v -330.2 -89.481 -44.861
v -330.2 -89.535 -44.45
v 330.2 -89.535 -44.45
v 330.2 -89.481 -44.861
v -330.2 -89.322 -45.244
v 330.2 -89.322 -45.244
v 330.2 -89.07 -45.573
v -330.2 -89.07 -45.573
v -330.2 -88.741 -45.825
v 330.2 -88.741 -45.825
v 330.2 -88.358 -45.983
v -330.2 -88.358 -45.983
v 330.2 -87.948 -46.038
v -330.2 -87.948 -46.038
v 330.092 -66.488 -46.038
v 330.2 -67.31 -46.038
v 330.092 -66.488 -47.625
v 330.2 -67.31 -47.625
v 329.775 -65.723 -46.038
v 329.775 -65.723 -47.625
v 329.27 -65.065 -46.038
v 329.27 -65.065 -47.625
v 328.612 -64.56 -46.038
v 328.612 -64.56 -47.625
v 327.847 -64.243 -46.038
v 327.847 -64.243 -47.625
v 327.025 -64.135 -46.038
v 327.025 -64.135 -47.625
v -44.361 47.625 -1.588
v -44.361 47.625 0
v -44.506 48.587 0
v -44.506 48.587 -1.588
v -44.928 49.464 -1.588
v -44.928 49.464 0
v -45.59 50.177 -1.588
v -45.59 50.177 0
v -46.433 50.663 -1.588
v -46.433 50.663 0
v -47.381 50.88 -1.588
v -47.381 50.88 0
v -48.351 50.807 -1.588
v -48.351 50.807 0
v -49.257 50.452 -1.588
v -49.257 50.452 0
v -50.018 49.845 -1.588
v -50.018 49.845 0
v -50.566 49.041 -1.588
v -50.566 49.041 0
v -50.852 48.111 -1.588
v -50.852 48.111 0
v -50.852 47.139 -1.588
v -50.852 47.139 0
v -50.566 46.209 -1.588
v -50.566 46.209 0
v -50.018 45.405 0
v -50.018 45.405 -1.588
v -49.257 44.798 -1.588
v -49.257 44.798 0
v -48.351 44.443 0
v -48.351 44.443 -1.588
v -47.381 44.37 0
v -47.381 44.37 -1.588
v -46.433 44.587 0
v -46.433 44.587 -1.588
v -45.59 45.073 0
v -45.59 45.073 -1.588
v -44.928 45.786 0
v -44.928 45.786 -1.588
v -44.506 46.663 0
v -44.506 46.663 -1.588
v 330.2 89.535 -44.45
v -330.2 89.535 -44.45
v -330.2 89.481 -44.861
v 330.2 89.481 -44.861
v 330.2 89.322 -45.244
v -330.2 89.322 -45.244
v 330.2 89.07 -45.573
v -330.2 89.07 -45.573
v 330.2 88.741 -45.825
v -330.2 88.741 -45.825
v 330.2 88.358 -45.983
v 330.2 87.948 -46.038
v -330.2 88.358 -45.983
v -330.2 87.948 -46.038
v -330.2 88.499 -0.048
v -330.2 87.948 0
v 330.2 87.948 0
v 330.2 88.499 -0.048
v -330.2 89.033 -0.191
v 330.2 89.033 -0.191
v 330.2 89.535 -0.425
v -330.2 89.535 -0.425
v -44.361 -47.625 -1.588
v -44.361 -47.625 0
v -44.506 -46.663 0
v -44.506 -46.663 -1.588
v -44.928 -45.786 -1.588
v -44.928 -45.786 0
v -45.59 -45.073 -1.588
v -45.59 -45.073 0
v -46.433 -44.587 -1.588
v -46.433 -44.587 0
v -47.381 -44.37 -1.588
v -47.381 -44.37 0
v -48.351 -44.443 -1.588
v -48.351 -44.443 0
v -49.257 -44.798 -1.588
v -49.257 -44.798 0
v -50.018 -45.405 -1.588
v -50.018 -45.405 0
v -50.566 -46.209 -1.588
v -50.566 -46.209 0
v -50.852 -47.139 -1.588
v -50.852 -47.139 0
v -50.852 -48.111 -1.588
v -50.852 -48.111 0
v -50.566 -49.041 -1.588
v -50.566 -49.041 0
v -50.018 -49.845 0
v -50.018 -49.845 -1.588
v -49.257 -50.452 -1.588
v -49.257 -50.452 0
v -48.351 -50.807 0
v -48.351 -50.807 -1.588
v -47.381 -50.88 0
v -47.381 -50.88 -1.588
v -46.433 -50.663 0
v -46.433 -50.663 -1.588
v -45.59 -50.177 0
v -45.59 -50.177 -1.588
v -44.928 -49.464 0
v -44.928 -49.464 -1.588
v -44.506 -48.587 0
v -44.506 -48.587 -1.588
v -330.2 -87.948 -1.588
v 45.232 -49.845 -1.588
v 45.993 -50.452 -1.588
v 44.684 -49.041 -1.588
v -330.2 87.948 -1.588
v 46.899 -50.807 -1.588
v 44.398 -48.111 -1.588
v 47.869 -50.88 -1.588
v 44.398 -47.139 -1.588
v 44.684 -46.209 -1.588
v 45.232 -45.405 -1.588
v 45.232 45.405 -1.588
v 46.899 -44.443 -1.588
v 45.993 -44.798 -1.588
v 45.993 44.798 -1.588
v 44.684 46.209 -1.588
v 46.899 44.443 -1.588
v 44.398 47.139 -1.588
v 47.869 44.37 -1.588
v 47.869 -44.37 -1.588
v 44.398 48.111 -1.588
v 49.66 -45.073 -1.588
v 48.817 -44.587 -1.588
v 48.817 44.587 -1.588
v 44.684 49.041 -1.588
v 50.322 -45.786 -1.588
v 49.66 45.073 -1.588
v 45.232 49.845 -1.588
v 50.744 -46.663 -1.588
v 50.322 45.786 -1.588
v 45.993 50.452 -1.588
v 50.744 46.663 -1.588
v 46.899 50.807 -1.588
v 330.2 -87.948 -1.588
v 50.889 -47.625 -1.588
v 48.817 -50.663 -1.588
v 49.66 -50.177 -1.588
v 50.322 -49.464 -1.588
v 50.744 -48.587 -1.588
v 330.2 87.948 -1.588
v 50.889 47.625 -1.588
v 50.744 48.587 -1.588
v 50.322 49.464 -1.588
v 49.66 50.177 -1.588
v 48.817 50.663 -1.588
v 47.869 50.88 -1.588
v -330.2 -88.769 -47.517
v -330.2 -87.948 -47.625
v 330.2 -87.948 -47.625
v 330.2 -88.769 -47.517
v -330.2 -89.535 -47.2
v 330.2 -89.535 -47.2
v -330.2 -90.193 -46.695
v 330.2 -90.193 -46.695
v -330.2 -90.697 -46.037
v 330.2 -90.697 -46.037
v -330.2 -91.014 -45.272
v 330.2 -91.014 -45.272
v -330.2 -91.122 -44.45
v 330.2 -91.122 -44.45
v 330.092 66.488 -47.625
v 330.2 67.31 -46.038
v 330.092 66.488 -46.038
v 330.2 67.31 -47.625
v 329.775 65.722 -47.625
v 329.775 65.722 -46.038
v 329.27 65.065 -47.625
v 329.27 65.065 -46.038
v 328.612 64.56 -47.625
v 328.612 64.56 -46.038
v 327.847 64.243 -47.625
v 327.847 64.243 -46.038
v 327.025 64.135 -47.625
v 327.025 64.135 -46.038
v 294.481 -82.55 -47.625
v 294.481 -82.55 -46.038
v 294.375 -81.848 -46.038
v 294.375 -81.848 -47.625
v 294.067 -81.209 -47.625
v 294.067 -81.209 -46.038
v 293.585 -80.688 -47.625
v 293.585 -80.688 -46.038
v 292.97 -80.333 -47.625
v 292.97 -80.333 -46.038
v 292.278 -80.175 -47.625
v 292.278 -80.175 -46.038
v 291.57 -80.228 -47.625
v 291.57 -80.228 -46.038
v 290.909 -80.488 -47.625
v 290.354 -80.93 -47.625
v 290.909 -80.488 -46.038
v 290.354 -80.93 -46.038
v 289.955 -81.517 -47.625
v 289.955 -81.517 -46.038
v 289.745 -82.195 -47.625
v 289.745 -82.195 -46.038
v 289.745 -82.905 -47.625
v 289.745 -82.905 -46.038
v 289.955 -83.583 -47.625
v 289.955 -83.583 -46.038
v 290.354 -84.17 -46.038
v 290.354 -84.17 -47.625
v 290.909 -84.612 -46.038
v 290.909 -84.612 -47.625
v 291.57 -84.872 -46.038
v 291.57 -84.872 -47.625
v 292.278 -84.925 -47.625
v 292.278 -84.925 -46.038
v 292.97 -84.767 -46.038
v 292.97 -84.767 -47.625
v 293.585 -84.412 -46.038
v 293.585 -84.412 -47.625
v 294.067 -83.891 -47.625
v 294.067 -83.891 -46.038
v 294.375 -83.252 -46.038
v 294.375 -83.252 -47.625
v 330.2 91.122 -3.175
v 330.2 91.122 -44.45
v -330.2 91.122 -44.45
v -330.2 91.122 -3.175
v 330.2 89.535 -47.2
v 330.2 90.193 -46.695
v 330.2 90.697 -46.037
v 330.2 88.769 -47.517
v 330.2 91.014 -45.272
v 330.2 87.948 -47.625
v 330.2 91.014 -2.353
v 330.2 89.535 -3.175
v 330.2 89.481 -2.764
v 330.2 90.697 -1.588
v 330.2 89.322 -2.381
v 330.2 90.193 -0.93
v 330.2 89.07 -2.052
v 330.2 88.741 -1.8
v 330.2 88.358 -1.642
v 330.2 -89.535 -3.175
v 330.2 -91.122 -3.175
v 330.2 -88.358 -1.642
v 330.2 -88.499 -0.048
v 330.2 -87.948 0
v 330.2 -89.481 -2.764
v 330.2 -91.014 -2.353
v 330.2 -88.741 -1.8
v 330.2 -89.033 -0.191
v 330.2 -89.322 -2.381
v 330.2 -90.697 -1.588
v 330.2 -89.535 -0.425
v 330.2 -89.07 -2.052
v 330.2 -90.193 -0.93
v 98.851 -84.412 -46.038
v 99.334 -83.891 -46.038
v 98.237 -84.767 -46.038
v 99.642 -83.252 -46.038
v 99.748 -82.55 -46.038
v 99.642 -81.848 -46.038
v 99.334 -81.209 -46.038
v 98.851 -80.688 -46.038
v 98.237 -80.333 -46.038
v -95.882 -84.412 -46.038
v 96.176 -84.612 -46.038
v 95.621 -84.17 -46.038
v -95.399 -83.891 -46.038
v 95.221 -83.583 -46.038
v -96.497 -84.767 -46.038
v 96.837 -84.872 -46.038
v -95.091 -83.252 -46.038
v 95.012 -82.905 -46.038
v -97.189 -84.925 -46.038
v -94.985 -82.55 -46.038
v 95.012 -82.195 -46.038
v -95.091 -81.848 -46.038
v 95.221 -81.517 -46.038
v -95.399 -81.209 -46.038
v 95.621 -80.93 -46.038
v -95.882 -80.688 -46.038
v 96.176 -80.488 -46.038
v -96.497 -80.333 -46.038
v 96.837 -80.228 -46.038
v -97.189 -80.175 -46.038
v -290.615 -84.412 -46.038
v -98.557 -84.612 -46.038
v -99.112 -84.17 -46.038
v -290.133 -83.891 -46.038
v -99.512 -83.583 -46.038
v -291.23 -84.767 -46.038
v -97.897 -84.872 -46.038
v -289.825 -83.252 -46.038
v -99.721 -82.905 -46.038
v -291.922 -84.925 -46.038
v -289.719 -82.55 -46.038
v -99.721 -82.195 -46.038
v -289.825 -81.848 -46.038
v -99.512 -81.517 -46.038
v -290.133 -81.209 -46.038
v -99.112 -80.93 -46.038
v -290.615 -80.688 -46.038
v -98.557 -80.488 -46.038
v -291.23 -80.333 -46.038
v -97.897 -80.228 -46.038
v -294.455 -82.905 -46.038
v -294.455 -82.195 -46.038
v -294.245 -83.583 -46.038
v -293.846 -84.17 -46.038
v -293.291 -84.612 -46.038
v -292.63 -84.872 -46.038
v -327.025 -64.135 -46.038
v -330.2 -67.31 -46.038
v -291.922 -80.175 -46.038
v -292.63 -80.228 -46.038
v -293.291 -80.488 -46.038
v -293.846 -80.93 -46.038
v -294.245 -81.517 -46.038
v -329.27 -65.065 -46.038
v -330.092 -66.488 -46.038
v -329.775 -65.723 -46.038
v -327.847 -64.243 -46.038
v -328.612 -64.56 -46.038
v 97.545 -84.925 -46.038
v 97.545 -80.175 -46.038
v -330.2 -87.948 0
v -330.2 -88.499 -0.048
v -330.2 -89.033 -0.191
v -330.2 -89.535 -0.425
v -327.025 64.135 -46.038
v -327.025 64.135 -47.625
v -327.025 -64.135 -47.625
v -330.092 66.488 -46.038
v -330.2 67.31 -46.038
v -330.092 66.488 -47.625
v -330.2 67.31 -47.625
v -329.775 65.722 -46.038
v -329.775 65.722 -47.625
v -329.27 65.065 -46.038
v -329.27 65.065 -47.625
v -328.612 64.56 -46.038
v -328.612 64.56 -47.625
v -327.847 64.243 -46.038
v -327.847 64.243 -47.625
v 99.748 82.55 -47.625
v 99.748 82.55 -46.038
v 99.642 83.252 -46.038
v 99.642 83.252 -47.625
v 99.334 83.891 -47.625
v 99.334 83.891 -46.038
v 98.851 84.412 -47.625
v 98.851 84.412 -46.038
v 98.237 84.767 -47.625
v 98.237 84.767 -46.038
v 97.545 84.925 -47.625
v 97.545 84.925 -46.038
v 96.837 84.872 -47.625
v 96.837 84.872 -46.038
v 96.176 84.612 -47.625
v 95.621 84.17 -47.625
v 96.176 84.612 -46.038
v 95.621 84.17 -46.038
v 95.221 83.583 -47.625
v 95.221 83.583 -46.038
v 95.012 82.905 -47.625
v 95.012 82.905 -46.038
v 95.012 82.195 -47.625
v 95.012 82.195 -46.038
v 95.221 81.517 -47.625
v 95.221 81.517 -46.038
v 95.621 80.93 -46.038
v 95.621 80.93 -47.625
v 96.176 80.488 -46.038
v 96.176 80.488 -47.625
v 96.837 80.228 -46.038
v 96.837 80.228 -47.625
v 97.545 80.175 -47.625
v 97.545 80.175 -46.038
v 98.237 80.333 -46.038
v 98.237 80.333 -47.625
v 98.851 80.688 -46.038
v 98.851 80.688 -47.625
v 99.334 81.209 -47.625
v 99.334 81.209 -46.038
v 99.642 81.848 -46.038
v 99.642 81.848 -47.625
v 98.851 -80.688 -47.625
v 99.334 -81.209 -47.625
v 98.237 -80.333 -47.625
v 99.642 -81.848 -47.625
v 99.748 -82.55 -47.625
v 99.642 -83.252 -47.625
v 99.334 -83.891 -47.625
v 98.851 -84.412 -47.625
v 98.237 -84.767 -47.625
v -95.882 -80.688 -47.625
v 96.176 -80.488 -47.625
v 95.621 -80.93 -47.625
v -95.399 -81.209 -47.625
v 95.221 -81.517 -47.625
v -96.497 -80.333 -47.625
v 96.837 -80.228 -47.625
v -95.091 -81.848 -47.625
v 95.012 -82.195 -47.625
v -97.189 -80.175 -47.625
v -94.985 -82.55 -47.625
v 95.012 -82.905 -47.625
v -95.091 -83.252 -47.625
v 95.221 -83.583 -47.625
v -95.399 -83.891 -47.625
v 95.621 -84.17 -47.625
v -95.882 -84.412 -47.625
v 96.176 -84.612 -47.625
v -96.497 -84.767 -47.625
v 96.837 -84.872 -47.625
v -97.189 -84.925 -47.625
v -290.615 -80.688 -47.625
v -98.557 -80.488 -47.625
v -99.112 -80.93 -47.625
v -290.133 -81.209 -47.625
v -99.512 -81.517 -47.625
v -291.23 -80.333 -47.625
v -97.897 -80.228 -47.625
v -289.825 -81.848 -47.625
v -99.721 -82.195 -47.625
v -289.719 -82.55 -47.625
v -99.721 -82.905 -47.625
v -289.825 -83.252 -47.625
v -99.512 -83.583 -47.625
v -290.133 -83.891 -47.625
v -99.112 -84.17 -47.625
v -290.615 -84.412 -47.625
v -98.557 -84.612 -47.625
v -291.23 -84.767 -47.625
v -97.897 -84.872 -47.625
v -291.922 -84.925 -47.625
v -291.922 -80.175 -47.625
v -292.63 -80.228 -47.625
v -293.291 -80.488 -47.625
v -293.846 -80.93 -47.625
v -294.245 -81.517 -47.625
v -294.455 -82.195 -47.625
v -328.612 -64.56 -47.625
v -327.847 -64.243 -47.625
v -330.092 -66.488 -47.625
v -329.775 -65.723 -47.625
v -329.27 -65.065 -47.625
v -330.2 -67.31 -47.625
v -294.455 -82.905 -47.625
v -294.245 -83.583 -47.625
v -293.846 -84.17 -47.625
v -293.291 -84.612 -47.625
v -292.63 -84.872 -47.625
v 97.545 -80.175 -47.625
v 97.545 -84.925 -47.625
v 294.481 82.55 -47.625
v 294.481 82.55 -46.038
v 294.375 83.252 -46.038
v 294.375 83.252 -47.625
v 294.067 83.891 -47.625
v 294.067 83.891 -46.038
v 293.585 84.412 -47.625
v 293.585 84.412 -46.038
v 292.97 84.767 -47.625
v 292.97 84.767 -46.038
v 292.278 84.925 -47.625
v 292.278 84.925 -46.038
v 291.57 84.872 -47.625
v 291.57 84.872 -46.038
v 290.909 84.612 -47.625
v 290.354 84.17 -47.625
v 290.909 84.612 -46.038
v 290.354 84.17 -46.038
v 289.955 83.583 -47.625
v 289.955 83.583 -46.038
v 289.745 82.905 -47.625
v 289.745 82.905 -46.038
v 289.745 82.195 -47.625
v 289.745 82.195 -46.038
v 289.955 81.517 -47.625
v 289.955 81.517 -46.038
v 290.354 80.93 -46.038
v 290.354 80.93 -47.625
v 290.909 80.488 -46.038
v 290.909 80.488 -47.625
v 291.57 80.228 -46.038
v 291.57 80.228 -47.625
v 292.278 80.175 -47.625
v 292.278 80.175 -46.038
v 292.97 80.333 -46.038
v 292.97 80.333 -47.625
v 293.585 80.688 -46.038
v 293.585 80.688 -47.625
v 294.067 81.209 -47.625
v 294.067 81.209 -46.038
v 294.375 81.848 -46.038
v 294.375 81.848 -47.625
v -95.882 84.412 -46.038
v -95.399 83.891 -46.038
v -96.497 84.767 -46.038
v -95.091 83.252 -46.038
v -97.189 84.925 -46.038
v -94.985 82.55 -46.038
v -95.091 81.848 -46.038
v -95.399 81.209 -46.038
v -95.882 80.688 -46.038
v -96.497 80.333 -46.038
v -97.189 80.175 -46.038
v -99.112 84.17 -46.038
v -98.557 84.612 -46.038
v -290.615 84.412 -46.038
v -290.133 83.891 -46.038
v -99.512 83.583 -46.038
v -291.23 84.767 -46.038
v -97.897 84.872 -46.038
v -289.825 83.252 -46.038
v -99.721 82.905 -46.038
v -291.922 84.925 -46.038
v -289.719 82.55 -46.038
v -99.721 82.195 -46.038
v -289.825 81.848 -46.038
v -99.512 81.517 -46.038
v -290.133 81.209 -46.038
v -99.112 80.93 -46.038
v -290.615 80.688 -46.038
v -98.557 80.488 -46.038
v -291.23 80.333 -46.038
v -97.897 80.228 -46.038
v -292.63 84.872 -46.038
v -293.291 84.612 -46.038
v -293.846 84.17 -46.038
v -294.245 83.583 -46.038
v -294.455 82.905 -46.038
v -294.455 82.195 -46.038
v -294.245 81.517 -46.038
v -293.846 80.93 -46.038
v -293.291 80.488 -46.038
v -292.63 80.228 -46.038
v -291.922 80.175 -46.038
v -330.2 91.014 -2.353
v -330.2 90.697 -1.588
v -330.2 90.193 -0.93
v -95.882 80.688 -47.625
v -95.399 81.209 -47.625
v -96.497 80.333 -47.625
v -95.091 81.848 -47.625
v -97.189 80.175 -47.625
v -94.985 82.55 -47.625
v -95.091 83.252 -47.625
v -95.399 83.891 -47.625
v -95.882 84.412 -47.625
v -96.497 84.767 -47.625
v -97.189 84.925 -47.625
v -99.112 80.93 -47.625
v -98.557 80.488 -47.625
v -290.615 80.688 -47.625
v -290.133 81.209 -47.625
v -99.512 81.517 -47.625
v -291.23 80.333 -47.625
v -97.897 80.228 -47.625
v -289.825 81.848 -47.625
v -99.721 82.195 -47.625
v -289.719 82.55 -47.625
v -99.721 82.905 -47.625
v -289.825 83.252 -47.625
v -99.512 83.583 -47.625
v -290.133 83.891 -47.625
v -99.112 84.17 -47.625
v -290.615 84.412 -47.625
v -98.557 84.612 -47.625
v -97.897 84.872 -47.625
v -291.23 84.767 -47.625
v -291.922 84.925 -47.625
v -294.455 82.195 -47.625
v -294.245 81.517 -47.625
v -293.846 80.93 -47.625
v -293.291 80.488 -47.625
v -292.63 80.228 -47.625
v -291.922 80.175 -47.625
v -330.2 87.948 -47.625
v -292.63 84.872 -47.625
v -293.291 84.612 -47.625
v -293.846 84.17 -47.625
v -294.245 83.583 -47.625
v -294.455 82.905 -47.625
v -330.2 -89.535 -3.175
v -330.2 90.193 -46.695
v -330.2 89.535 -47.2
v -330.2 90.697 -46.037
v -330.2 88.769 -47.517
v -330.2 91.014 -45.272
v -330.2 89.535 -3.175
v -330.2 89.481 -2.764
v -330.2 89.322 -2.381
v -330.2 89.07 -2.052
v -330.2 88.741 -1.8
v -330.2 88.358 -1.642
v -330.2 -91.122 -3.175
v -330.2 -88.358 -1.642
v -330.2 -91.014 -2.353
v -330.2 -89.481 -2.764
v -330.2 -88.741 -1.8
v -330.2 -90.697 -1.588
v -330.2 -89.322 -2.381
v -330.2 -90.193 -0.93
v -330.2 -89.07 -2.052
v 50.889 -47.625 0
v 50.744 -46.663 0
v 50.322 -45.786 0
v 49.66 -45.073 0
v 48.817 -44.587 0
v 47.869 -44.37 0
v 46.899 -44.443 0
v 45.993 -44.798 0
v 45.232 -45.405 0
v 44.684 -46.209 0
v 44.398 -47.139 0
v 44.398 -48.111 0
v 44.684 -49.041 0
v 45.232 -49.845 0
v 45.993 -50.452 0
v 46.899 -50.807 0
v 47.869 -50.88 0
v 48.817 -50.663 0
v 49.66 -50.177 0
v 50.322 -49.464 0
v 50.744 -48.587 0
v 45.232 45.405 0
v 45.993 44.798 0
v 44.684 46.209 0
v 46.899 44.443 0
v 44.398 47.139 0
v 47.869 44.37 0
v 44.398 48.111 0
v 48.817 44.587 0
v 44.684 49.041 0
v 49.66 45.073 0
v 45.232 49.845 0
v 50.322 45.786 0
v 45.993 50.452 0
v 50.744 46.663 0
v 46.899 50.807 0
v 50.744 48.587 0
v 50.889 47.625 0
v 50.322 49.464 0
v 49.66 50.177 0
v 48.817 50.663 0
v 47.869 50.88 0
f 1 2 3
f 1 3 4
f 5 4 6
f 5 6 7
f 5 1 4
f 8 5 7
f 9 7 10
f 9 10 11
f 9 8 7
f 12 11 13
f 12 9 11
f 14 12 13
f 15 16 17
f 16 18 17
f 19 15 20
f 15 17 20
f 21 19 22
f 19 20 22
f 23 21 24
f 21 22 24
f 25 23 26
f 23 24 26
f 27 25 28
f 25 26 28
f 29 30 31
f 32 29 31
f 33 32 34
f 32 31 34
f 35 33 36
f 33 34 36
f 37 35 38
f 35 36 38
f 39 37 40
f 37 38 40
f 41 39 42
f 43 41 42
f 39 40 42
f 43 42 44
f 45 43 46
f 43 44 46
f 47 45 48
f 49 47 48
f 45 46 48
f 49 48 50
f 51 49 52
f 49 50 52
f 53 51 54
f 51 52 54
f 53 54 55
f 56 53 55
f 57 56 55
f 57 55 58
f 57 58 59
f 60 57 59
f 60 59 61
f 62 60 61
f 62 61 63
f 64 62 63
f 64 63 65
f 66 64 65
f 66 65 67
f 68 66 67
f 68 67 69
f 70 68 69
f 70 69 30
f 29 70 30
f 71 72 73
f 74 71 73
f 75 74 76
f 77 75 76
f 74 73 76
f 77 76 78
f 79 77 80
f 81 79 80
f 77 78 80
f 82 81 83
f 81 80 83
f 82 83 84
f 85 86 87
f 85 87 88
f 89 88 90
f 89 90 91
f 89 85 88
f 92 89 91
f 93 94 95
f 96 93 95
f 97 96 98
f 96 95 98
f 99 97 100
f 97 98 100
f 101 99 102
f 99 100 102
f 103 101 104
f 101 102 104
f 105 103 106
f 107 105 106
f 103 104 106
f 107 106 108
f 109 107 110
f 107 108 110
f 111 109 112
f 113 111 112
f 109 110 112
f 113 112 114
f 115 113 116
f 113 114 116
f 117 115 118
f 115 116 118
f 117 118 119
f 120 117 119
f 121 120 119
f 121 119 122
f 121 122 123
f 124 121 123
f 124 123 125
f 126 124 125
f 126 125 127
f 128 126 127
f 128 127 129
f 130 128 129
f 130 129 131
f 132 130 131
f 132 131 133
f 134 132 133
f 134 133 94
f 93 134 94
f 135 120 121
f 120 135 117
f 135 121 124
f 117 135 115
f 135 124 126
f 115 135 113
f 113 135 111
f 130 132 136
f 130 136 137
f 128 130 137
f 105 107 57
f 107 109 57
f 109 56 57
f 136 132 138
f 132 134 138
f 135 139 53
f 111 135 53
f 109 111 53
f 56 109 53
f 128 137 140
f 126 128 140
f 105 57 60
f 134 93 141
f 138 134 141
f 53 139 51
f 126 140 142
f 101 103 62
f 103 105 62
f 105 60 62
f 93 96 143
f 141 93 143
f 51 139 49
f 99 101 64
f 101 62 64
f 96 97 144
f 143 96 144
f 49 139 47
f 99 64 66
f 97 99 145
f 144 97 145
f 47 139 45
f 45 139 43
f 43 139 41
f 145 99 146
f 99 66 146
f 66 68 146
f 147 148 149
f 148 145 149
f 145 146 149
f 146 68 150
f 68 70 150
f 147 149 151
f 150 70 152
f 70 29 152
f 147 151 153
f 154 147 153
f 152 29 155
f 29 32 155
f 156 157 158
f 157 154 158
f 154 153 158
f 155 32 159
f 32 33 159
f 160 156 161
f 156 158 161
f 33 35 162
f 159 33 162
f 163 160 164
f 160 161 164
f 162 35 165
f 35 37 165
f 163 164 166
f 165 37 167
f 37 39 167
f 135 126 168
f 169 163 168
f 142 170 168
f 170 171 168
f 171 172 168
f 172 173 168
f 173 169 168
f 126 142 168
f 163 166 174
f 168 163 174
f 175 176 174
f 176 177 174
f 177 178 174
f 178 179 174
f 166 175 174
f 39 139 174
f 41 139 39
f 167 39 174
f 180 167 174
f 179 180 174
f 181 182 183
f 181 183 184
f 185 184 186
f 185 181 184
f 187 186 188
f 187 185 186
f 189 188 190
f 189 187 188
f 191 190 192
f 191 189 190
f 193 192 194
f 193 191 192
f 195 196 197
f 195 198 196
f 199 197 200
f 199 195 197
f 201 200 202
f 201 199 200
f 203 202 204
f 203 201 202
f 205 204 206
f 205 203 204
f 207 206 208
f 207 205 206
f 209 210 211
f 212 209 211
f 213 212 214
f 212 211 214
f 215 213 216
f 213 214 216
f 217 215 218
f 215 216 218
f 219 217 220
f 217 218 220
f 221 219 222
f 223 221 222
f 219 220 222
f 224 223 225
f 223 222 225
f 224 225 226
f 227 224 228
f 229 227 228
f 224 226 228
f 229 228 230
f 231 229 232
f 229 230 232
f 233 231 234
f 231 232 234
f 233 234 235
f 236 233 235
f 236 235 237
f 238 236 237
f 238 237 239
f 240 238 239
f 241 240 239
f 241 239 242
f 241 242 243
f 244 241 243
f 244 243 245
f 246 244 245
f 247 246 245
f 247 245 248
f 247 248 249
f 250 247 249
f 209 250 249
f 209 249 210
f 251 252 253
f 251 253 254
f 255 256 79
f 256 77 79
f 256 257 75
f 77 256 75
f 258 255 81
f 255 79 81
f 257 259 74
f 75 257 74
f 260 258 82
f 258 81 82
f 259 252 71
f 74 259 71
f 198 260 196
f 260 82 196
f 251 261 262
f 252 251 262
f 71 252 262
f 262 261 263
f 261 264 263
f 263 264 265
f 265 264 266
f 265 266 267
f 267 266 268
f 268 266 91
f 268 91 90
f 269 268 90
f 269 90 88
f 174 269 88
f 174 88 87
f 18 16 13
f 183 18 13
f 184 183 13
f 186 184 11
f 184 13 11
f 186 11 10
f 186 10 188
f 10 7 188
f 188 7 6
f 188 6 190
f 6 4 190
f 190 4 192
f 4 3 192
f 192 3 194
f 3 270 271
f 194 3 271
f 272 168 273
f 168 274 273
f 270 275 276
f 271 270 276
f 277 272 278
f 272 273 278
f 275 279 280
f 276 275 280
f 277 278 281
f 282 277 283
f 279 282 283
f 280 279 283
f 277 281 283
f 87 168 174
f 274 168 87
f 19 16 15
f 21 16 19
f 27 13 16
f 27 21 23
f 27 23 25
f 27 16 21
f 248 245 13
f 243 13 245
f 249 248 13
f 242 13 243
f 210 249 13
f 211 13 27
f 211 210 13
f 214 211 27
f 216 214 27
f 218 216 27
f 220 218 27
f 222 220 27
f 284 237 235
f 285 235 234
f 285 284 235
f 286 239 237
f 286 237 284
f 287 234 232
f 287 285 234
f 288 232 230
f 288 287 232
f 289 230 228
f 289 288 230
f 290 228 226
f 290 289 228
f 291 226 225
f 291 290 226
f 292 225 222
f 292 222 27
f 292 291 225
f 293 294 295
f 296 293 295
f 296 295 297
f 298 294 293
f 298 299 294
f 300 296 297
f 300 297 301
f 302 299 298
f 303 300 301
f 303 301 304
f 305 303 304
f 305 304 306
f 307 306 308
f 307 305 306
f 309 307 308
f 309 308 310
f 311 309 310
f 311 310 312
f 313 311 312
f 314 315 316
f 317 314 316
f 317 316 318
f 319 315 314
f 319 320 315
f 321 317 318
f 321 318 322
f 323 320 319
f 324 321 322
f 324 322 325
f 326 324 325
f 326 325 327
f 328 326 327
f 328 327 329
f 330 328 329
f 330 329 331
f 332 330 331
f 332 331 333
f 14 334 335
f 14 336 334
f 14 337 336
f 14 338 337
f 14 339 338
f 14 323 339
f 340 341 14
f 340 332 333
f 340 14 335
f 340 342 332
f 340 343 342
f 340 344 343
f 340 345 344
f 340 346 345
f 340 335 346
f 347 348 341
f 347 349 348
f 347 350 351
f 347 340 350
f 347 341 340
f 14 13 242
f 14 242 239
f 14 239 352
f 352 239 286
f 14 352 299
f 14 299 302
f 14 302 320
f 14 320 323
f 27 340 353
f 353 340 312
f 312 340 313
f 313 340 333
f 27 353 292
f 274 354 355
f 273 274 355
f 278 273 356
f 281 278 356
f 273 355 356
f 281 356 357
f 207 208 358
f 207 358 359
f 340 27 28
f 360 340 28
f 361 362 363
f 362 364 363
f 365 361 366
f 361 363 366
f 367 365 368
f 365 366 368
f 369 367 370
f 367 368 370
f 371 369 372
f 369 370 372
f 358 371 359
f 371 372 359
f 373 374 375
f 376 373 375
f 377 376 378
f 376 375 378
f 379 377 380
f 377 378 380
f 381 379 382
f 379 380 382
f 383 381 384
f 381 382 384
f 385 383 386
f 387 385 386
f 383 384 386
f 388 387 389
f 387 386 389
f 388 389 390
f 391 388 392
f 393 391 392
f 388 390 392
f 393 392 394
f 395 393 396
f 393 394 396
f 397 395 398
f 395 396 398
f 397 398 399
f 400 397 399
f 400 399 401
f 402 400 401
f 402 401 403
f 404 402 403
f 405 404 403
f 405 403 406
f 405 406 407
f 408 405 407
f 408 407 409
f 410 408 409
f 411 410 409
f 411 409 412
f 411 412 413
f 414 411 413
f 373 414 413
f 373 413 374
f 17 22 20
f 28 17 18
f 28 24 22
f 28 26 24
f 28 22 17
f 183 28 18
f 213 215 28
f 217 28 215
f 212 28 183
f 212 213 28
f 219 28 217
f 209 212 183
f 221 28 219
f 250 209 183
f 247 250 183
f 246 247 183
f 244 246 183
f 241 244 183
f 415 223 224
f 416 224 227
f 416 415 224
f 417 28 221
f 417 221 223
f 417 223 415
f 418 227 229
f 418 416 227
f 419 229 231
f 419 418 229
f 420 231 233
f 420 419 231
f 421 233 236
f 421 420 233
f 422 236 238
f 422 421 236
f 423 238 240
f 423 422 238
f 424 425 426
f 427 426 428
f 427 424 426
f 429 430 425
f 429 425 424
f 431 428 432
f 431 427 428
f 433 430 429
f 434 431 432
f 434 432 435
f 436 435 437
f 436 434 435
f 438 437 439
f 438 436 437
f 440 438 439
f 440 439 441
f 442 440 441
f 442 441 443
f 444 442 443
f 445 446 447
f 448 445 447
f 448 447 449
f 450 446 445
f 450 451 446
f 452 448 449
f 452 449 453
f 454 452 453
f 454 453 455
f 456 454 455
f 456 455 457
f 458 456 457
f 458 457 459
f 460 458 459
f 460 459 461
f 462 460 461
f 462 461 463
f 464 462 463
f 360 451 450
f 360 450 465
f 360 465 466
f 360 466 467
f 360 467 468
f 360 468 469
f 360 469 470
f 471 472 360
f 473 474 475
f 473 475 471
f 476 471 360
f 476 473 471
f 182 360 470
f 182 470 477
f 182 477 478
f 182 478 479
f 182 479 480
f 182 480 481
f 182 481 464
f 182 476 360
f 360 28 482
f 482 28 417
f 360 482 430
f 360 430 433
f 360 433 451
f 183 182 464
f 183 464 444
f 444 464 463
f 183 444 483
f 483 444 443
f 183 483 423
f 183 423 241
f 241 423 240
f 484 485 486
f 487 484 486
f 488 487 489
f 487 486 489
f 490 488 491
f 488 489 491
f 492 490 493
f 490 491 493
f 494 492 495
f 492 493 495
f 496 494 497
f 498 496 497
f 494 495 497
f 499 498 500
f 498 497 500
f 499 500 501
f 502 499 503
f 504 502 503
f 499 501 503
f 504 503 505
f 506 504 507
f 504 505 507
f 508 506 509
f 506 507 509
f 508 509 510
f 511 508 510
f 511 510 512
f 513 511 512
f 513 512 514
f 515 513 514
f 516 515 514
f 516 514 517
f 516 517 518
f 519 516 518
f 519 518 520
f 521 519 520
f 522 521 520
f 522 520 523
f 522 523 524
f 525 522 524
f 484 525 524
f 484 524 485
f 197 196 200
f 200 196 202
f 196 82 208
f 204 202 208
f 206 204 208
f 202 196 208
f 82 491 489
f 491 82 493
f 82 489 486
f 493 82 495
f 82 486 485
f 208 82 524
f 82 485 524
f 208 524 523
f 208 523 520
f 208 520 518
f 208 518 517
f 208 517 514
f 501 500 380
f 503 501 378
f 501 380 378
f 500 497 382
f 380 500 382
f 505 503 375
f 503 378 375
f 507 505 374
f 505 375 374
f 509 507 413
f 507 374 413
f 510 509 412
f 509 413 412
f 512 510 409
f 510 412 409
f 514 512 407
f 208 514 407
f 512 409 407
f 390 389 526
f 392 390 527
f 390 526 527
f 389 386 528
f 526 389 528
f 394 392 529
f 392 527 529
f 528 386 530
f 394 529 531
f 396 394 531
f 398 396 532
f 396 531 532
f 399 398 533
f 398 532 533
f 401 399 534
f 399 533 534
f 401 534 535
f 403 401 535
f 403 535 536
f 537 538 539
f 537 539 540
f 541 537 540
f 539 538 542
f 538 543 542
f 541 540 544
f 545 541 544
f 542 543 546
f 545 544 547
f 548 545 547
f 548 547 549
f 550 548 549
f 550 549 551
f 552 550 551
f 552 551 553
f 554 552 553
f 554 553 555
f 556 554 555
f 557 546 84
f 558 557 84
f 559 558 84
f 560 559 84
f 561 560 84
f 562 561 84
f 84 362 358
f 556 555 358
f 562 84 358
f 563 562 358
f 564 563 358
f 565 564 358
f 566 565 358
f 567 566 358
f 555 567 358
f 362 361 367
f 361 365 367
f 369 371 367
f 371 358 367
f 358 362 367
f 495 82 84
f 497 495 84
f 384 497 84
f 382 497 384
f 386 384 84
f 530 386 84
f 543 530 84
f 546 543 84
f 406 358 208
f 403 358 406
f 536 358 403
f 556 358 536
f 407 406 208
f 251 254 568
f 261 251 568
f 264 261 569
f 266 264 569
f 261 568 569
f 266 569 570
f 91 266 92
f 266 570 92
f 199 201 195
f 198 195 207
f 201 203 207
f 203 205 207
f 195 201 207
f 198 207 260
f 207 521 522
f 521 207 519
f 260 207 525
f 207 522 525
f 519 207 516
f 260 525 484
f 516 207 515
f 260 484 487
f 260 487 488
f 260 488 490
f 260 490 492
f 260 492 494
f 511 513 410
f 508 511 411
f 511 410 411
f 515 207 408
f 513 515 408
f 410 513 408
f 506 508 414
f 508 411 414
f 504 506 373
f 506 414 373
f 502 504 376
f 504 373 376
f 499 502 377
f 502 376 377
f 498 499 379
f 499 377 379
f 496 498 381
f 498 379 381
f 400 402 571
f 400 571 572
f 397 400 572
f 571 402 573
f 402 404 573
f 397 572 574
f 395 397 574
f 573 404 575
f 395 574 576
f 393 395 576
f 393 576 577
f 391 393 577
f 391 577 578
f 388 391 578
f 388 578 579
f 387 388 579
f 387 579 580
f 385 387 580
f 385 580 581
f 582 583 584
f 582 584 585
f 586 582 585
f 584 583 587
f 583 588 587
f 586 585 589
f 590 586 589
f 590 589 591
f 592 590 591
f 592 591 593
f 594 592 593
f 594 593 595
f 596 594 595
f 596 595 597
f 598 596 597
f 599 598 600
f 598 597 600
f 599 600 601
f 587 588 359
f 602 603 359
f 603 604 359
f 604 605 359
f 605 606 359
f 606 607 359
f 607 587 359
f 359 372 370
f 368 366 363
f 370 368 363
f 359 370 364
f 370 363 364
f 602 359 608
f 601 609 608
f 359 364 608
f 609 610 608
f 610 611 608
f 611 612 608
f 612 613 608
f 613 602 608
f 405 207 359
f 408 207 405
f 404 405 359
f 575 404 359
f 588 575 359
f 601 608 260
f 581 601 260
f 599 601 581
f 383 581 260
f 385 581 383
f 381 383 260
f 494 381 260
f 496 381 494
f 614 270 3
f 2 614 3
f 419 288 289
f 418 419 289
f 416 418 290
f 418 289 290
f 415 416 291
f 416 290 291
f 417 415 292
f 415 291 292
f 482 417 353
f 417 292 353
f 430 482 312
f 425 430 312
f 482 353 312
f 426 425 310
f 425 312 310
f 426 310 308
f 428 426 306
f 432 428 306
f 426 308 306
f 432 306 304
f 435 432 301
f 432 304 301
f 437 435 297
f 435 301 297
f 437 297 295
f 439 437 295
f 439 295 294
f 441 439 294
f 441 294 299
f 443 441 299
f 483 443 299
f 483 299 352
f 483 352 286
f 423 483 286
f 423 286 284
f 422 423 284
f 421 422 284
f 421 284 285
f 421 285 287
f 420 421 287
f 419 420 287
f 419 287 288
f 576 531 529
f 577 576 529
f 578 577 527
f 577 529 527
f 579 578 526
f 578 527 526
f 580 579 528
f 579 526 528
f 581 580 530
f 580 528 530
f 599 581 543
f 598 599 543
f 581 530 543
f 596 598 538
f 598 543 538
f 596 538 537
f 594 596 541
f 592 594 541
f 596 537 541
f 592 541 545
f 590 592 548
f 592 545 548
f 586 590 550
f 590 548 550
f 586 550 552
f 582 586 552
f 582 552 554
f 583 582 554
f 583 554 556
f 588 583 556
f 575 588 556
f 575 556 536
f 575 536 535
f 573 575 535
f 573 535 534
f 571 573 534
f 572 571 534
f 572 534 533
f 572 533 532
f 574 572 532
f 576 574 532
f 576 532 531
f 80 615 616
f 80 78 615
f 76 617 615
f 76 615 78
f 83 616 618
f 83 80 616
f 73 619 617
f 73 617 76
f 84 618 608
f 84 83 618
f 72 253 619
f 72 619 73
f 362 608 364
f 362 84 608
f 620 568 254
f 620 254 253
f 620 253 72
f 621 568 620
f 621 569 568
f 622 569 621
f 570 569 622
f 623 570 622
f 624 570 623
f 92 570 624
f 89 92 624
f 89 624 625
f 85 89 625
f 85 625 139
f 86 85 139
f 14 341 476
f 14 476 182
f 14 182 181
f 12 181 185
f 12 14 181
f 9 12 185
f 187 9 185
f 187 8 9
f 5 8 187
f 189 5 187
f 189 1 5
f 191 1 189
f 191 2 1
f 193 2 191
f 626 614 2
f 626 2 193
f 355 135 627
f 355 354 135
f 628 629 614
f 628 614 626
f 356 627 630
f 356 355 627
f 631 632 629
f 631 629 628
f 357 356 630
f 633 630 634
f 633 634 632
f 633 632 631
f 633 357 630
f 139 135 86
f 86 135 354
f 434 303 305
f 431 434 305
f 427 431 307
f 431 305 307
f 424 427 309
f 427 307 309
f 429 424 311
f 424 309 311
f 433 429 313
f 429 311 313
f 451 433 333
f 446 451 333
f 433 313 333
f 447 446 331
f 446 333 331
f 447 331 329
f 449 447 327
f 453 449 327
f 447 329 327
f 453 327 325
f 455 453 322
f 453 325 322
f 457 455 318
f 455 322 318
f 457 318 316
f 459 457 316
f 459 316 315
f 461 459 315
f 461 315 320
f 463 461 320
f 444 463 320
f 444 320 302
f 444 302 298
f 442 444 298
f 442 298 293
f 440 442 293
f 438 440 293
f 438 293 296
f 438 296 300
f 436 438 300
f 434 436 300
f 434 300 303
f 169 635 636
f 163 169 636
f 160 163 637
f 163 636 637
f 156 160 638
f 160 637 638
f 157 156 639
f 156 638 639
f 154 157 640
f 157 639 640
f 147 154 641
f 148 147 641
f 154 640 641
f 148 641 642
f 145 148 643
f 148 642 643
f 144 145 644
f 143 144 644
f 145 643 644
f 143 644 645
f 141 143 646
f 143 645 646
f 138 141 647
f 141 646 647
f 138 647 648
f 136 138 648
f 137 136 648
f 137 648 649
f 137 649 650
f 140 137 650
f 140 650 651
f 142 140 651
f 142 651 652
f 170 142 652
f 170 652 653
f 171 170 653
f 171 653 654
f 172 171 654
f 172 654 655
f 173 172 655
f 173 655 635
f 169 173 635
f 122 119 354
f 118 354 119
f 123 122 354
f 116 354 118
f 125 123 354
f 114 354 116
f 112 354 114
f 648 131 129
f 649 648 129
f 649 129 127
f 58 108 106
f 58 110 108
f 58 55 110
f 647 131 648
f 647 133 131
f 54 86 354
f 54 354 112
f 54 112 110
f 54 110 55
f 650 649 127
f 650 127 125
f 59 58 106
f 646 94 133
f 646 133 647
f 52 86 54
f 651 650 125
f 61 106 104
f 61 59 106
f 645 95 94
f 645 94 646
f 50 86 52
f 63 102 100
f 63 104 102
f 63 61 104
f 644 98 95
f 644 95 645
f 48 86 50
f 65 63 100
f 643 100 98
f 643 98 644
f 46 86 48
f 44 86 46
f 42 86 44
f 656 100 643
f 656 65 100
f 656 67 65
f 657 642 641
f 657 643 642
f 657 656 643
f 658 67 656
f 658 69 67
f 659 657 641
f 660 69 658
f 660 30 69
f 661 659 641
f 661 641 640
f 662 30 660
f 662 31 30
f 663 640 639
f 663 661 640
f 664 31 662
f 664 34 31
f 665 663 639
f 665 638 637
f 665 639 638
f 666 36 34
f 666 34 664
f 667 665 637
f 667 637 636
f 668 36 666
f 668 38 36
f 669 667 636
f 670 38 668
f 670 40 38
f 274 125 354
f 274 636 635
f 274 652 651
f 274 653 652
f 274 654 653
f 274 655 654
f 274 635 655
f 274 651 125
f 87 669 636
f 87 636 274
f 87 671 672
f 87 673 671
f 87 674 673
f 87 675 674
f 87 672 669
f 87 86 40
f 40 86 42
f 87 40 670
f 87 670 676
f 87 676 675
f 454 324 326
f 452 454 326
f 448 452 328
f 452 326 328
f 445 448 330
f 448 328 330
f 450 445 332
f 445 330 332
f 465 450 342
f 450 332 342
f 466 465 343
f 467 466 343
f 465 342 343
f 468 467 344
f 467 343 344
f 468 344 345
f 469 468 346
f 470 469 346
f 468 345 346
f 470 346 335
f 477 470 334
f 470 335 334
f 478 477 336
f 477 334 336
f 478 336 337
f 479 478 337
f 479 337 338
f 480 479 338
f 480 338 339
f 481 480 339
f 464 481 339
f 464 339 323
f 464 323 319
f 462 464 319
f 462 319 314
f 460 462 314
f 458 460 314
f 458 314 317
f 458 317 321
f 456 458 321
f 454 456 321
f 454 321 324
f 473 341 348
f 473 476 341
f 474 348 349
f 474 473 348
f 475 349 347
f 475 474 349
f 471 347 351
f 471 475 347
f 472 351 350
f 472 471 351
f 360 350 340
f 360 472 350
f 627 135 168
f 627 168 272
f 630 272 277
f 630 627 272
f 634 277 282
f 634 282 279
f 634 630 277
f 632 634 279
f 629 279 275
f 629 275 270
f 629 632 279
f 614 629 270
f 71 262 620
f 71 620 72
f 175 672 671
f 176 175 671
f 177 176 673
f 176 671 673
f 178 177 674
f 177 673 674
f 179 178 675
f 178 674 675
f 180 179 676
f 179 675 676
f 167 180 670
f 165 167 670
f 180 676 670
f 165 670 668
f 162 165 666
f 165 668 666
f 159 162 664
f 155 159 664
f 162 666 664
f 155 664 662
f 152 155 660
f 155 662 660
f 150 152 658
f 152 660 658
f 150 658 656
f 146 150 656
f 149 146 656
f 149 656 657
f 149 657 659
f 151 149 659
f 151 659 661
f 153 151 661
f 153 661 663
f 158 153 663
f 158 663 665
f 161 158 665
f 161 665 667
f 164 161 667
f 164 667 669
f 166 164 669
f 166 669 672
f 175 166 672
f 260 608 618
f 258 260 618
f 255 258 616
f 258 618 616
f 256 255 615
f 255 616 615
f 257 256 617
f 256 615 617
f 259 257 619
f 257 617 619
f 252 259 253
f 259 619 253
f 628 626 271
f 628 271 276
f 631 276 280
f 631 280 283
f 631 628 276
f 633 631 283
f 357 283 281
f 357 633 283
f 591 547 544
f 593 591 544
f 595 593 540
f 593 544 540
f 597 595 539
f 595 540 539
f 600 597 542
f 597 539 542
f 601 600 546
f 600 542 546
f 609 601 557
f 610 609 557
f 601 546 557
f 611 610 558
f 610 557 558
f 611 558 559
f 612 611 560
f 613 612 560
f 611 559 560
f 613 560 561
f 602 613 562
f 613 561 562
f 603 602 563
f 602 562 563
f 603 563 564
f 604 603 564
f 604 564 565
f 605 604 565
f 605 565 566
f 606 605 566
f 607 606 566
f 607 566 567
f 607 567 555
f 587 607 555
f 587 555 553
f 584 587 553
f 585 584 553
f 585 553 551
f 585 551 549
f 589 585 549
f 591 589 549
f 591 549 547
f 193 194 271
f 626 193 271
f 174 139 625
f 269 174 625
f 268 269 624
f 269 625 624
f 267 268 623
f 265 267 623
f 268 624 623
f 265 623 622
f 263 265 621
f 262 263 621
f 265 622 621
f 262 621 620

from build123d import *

# Parameters (mm, degrees)
SKETCH1_W                          = 660.4
SKETCH1_H                          = 179.07
BASE_FLANGE1_DEPTH                 = 1.5875
MITER_START                        = -330.2
MITER_FLANGE1_DEPTH                = 660.4
MITER_FLANGE1_2_DEPTH              = 660.4
F_3_16_0_1875_DIAMETER_HOLE1_D     = 4.7625
F_3_16_0_1875_DIAMETER_HOLE1_DEPTH = 5.1054
F_3_16_0_1875_DIAMETER_HOLE1_TIP   = 1.430799349
SKETCH25_R                         = 3.2639
CUT_EXTRUDE1_DEPTH                 = 346.837375989
FILLET1_R                          = 3.175


# Read off the part's stored shape, not the designer's step: Miter Flange1
# Sheet-metal steps are written as plain solids
with BuildPart() as part:
    # Sketch1 → Base-Flange1 (new body)
    with BuildSketch(Plane.XY):
        Rectangle(SKETCH1_W, SKETCH1_H)
    extrude(amount=-BASE_FLANGE1_DEPTH)

    # Miter Flange1 outline → Miter Flange1 (cut)
    with BuildSketch(Plane.YZ.offset(MITER_START)):
        with BuildLine():
            ThreePointArc((87.9475, 0), (88.769250468, -0.108185502), (89.535, -0.425369343))
            Line((89.535, -0.425369343), (89.535, 0))
            Line((89.535, 0), (87.9475, 0))
        make_face()
    miter_flange1 = extrude(amount=MITER_FLANGE1_DEPTH, mode=Mode.SUBTRACT)

    # Miter Flange1 2 outline → Miter Flange1 2 (add)
    with BuildSketch(Plane.YZ.offset(MITER_START)):
        with BuildLine():
            Line((87.9475, -46.0375), (64.135, -46.0375))
            Line((64.135, -46.0375), (64.135, -47.625))
            Line((64.135, -47.625), (87.9475, -47.625))
            ThreePointArc((87.9475, -47.625), (90.19256403, -46.69506403), (91.1225, -44.45))
            Line((91.1225, -44.45), (91.1225, -3.175))
            ThreePointArc((91.1225, -3.175), (90.697130657, -1.5875), (89.535, -0.425369343))
            Line((89.535, -0.425369343), (89.535, -1.5875))
            Line((89.535, -1.5875), (87.9475, -1.5875))
            ThreePointArc((87.9475, -1.5875), (89.070032015, -2.052467985), (89.535, -3.175))
            Line((89.535, -3.175), (89.535, -44.45))
            ThreePointArc((89.535, -44.45), (89.070032015, -45.572532015), (87.9475, -46.0375))
        make_face()
    miter_flange1_2 = extrude(amount=MITER_FLANGE1_2_DEPTH)

    # Mirror1: Miter Flange1, Miter Flange1 2 across plane
    add(miter_flange1.mirror(Plane.ZX), mode=Mode.SUBTRACT)
    add(miter_flange1_2.mirror(Plane.ZX))

    # 3/16 (0.1875) Diameter Hole1
    with Locations(Plane(origin=(0, 0, -47.625), x_dir=(-1, 0, 0), z_dir=(0, 0, -1))):
        with Locations((-292.1, 82.55), (-292.1, -82.55), (-97.366666667, 82.55), (-97.366666667, -82.55), (97.366666667, 82.55), (97.366666667, -82.55), (292.1, -82.55), (292.1, 82.55)):
            Hole(F_3_16_0_1875_DIAMETER_HOLE1_D / 2, depth=F_3_16_0_1875_DIAMETER_HOLE1_DEPTH)
            with Locations((0, 0, -(F_3_16_0_1875_DIAMETER_HOLE1_DEPTH + F_3_16_0_1875_DIAMETER_HOLE1_TIP / 2))):  # 118° drill point
                Cone(0, F_3_16_0_1875_DIAMETER_HOLE1_D / 2, F_3_16_0_1875_DIAMETER_HOLE1_TIP, mode=Mode.SUBTRACT)

    # Sketch25 → Cut-Extrude1 (cut, through all)
    with BuildSketch(Plane.XY):
        with Locations((47.625, 47.625)):
            Circle(SKETCH25_R)
        with Locations((47.625, -47.625)):
            Circle(SKETCH25_R)
        with Locations((-47.625, -47.625)):
            Circle(SKETCH25_R)
        with Locations((-47.625, 47.625)):
            Circle(SKETCH25_R)
    extrude(amount=-CUT_EXTRUDE1_DEPTH, mode=Mode.SUBTRACT)

    # Fillet1
    fillet1_edges = [part.edges().sort_by_distance(p)[0] for p in [
        (330.2, 64.135, -46.83125),
        (-330.2, 64.135, -46.83125),
        (330.2, -64.135, -46.83125),
        (-330.2, -64.135, -46.83125),
    ]]
    fillet(fillet1_edges, radius=FILLET1_R)


solid = part.part
